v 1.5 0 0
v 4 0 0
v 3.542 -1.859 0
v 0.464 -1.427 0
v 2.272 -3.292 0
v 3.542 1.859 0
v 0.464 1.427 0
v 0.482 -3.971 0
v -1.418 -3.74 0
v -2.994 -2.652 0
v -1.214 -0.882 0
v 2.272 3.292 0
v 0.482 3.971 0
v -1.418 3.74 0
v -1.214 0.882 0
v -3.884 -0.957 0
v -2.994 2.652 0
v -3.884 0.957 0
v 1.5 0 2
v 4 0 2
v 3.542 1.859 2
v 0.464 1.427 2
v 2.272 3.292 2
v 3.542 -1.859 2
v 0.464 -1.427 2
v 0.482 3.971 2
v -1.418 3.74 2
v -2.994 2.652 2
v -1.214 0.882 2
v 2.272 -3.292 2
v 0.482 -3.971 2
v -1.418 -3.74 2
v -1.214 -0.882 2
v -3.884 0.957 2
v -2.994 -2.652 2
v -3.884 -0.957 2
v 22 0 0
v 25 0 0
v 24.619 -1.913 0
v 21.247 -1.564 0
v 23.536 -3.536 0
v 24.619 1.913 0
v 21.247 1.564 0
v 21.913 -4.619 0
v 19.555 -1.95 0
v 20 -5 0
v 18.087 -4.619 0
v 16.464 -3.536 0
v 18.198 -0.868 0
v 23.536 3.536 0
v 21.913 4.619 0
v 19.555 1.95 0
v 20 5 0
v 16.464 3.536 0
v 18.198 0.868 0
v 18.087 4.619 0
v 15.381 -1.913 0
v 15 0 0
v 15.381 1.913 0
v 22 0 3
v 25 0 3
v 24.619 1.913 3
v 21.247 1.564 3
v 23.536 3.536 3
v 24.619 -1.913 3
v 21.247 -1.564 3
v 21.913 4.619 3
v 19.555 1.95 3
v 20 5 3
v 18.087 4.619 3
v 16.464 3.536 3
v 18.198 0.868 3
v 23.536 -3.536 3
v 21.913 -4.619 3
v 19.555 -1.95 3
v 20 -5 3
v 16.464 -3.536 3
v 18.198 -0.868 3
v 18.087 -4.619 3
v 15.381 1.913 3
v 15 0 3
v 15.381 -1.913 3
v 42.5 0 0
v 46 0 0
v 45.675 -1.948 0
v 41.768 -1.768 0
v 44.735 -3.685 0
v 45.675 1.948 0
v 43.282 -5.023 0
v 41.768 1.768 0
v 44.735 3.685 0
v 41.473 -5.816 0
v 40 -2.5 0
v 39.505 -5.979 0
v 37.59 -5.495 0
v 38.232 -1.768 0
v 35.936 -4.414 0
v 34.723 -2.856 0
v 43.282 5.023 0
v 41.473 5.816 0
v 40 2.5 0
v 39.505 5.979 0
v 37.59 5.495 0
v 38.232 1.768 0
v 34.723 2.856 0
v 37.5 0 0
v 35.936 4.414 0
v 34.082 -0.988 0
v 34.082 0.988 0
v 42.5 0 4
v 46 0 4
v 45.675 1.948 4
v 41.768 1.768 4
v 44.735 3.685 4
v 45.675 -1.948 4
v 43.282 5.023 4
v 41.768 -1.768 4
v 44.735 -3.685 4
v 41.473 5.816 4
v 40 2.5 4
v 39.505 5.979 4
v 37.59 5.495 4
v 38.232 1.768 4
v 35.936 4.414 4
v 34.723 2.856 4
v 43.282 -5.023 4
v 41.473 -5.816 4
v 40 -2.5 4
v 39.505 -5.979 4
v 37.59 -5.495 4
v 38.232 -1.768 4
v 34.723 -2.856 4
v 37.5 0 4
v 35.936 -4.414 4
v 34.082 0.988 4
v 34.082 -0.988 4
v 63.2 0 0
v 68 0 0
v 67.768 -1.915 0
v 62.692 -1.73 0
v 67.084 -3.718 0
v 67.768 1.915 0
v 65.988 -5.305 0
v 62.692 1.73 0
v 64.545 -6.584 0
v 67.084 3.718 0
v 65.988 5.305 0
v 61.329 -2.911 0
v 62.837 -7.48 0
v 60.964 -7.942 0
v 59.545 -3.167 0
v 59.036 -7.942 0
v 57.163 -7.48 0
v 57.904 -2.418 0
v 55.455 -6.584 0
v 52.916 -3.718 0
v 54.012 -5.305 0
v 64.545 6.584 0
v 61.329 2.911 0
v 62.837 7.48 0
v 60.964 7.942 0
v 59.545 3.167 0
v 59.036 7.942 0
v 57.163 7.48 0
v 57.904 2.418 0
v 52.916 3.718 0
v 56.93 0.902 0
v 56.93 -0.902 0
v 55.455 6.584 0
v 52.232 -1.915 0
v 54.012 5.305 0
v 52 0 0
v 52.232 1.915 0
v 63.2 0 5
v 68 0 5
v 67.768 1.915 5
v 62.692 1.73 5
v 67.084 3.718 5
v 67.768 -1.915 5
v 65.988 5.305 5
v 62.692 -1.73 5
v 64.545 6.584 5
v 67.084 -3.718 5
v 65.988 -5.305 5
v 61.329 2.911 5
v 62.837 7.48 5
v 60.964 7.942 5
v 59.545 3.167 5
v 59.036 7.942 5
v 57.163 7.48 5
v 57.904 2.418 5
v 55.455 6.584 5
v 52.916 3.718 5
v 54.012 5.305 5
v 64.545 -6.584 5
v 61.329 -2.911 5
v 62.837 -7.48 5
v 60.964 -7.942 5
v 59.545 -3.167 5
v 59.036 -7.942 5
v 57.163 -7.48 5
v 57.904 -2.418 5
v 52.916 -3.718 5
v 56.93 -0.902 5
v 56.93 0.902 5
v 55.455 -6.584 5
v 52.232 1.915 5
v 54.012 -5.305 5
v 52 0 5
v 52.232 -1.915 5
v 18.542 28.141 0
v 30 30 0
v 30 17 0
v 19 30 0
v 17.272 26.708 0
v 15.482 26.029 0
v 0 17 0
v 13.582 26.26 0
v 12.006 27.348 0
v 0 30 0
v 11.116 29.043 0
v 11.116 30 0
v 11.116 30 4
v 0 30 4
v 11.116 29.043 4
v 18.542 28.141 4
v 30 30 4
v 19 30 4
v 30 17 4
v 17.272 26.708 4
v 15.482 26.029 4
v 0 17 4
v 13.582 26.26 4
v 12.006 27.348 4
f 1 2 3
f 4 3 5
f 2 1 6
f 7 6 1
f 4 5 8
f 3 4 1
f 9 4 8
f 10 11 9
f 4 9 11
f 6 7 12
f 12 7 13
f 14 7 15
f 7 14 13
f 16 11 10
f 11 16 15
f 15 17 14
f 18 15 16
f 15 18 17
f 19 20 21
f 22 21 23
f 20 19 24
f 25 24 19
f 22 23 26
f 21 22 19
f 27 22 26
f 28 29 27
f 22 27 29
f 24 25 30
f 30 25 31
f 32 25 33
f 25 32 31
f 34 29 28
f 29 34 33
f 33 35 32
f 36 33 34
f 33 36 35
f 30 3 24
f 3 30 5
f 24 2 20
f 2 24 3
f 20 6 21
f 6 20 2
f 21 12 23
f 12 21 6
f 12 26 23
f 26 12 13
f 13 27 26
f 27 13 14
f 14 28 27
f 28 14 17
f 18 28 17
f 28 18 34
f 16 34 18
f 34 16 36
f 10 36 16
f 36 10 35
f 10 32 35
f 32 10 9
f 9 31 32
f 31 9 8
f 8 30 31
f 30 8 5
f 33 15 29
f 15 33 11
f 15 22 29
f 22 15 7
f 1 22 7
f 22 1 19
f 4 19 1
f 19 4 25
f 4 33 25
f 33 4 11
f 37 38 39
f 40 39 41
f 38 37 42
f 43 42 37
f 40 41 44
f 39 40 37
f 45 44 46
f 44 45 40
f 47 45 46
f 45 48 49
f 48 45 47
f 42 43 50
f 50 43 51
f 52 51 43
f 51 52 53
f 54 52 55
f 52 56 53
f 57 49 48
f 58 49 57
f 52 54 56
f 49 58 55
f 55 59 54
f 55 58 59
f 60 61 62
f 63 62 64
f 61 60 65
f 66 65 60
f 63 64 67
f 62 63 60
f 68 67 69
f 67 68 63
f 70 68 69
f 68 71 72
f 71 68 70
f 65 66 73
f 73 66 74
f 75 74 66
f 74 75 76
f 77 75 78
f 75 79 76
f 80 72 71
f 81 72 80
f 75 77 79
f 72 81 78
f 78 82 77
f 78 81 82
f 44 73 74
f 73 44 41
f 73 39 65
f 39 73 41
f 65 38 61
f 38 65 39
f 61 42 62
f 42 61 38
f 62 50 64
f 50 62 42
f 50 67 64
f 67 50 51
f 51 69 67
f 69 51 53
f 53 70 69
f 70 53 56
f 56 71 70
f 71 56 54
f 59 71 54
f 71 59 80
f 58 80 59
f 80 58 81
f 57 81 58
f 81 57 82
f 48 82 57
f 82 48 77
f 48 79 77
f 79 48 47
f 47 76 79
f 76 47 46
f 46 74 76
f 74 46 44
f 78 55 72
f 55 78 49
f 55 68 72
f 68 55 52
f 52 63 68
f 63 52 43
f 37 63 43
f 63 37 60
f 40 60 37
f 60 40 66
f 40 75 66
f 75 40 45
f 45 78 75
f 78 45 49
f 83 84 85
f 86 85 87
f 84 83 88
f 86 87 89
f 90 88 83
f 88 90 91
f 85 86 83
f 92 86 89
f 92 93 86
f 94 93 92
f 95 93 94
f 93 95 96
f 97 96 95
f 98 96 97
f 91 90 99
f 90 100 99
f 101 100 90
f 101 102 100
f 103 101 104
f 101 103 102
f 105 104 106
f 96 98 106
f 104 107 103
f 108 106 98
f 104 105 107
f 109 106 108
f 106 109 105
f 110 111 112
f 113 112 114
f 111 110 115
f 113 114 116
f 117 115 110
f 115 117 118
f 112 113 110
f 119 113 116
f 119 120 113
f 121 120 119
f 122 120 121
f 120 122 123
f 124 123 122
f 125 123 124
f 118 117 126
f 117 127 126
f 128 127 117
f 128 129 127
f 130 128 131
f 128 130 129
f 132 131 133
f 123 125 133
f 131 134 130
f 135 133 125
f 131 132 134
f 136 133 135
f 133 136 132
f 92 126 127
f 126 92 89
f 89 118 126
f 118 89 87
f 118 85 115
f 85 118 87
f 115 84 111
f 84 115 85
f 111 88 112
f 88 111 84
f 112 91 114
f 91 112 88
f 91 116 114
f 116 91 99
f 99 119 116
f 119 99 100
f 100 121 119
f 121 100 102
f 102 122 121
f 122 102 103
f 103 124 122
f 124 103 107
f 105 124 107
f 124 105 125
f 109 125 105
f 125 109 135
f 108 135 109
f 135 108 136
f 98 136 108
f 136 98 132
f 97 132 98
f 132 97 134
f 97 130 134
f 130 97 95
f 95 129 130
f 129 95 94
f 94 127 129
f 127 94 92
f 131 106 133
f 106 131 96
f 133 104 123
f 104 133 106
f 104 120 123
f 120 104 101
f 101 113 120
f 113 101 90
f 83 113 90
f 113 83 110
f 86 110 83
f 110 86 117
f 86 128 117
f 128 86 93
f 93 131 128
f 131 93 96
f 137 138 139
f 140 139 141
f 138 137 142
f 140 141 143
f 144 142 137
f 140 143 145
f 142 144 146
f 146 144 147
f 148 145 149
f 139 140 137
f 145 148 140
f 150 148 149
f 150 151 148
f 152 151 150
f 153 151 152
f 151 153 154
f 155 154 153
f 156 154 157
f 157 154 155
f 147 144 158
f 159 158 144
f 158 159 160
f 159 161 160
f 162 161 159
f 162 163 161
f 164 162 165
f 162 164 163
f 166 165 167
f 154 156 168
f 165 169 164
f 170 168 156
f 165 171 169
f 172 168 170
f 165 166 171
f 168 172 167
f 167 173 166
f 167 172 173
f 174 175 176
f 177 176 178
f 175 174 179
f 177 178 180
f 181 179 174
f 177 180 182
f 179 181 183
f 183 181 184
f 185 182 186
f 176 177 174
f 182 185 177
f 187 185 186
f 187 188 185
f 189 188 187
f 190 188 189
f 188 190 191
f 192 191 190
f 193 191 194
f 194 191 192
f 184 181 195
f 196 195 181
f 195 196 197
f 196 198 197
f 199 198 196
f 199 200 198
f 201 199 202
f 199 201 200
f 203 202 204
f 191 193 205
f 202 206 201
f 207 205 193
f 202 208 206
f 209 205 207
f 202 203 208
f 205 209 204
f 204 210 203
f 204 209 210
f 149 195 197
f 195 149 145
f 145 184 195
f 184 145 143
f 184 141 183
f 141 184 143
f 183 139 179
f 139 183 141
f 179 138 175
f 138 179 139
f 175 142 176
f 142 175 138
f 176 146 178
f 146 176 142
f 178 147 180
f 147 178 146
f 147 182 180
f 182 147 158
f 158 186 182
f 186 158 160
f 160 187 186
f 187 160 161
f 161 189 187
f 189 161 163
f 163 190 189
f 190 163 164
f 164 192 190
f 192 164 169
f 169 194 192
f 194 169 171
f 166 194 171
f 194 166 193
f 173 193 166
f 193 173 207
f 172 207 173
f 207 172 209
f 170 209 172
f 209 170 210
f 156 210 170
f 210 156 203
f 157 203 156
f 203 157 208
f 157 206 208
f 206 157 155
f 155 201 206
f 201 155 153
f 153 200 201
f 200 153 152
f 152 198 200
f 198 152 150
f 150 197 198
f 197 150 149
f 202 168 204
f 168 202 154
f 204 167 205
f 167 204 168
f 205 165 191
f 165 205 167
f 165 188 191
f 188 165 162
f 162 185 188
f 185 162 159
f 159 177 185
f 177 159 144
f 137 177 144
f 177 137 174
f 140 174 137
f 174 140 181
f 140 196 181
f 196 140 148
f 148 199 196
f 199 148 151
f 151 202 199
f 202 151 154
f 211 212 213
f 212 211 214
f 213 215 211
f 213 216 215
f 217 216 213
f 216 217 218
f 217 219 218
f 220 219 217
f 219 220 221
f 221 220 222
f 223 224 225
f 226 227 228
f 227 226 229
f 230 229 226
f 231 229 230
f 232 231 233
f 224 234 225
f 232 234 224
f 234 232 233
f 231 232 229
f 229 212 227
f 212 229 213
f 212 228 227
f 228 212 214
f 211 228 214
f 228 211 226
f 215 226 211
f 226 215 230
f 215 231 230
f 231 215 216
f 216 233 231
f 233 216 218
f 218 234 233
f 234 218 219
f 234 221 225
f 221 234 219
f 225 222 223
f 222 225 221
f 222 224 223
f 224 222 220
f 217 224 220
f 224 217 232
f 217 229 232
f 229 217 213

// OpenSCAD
// Purpose: 2D booleans on circle/square ahead of linear_extrude – spacer discs in multiple sizes.
sizes = [[8, 3, 2], [10, 4, 3], [12, 5, 4], [16, 6.4, 5]];   // [outside, inside, h]
for (i = [0 : len(sizes) - 1]) {
    s = sizes[i];
    translate([i * 20, 0, 0]) linear_extrude(height = s[2]) difference() {
        circle(d = s[0]);
        circle(d = s[1]);
    }
}
// Spacer with a groove: rectangle minus circle, united with a web.
translate([0, 20, 0]) linear_extrude(height = 4) union() {
    difference() {
        square([30, 10]);
        translate([15, 10]) circle(r = 4);
    }
    translate([0, -3]) square([30, 3]);
}
